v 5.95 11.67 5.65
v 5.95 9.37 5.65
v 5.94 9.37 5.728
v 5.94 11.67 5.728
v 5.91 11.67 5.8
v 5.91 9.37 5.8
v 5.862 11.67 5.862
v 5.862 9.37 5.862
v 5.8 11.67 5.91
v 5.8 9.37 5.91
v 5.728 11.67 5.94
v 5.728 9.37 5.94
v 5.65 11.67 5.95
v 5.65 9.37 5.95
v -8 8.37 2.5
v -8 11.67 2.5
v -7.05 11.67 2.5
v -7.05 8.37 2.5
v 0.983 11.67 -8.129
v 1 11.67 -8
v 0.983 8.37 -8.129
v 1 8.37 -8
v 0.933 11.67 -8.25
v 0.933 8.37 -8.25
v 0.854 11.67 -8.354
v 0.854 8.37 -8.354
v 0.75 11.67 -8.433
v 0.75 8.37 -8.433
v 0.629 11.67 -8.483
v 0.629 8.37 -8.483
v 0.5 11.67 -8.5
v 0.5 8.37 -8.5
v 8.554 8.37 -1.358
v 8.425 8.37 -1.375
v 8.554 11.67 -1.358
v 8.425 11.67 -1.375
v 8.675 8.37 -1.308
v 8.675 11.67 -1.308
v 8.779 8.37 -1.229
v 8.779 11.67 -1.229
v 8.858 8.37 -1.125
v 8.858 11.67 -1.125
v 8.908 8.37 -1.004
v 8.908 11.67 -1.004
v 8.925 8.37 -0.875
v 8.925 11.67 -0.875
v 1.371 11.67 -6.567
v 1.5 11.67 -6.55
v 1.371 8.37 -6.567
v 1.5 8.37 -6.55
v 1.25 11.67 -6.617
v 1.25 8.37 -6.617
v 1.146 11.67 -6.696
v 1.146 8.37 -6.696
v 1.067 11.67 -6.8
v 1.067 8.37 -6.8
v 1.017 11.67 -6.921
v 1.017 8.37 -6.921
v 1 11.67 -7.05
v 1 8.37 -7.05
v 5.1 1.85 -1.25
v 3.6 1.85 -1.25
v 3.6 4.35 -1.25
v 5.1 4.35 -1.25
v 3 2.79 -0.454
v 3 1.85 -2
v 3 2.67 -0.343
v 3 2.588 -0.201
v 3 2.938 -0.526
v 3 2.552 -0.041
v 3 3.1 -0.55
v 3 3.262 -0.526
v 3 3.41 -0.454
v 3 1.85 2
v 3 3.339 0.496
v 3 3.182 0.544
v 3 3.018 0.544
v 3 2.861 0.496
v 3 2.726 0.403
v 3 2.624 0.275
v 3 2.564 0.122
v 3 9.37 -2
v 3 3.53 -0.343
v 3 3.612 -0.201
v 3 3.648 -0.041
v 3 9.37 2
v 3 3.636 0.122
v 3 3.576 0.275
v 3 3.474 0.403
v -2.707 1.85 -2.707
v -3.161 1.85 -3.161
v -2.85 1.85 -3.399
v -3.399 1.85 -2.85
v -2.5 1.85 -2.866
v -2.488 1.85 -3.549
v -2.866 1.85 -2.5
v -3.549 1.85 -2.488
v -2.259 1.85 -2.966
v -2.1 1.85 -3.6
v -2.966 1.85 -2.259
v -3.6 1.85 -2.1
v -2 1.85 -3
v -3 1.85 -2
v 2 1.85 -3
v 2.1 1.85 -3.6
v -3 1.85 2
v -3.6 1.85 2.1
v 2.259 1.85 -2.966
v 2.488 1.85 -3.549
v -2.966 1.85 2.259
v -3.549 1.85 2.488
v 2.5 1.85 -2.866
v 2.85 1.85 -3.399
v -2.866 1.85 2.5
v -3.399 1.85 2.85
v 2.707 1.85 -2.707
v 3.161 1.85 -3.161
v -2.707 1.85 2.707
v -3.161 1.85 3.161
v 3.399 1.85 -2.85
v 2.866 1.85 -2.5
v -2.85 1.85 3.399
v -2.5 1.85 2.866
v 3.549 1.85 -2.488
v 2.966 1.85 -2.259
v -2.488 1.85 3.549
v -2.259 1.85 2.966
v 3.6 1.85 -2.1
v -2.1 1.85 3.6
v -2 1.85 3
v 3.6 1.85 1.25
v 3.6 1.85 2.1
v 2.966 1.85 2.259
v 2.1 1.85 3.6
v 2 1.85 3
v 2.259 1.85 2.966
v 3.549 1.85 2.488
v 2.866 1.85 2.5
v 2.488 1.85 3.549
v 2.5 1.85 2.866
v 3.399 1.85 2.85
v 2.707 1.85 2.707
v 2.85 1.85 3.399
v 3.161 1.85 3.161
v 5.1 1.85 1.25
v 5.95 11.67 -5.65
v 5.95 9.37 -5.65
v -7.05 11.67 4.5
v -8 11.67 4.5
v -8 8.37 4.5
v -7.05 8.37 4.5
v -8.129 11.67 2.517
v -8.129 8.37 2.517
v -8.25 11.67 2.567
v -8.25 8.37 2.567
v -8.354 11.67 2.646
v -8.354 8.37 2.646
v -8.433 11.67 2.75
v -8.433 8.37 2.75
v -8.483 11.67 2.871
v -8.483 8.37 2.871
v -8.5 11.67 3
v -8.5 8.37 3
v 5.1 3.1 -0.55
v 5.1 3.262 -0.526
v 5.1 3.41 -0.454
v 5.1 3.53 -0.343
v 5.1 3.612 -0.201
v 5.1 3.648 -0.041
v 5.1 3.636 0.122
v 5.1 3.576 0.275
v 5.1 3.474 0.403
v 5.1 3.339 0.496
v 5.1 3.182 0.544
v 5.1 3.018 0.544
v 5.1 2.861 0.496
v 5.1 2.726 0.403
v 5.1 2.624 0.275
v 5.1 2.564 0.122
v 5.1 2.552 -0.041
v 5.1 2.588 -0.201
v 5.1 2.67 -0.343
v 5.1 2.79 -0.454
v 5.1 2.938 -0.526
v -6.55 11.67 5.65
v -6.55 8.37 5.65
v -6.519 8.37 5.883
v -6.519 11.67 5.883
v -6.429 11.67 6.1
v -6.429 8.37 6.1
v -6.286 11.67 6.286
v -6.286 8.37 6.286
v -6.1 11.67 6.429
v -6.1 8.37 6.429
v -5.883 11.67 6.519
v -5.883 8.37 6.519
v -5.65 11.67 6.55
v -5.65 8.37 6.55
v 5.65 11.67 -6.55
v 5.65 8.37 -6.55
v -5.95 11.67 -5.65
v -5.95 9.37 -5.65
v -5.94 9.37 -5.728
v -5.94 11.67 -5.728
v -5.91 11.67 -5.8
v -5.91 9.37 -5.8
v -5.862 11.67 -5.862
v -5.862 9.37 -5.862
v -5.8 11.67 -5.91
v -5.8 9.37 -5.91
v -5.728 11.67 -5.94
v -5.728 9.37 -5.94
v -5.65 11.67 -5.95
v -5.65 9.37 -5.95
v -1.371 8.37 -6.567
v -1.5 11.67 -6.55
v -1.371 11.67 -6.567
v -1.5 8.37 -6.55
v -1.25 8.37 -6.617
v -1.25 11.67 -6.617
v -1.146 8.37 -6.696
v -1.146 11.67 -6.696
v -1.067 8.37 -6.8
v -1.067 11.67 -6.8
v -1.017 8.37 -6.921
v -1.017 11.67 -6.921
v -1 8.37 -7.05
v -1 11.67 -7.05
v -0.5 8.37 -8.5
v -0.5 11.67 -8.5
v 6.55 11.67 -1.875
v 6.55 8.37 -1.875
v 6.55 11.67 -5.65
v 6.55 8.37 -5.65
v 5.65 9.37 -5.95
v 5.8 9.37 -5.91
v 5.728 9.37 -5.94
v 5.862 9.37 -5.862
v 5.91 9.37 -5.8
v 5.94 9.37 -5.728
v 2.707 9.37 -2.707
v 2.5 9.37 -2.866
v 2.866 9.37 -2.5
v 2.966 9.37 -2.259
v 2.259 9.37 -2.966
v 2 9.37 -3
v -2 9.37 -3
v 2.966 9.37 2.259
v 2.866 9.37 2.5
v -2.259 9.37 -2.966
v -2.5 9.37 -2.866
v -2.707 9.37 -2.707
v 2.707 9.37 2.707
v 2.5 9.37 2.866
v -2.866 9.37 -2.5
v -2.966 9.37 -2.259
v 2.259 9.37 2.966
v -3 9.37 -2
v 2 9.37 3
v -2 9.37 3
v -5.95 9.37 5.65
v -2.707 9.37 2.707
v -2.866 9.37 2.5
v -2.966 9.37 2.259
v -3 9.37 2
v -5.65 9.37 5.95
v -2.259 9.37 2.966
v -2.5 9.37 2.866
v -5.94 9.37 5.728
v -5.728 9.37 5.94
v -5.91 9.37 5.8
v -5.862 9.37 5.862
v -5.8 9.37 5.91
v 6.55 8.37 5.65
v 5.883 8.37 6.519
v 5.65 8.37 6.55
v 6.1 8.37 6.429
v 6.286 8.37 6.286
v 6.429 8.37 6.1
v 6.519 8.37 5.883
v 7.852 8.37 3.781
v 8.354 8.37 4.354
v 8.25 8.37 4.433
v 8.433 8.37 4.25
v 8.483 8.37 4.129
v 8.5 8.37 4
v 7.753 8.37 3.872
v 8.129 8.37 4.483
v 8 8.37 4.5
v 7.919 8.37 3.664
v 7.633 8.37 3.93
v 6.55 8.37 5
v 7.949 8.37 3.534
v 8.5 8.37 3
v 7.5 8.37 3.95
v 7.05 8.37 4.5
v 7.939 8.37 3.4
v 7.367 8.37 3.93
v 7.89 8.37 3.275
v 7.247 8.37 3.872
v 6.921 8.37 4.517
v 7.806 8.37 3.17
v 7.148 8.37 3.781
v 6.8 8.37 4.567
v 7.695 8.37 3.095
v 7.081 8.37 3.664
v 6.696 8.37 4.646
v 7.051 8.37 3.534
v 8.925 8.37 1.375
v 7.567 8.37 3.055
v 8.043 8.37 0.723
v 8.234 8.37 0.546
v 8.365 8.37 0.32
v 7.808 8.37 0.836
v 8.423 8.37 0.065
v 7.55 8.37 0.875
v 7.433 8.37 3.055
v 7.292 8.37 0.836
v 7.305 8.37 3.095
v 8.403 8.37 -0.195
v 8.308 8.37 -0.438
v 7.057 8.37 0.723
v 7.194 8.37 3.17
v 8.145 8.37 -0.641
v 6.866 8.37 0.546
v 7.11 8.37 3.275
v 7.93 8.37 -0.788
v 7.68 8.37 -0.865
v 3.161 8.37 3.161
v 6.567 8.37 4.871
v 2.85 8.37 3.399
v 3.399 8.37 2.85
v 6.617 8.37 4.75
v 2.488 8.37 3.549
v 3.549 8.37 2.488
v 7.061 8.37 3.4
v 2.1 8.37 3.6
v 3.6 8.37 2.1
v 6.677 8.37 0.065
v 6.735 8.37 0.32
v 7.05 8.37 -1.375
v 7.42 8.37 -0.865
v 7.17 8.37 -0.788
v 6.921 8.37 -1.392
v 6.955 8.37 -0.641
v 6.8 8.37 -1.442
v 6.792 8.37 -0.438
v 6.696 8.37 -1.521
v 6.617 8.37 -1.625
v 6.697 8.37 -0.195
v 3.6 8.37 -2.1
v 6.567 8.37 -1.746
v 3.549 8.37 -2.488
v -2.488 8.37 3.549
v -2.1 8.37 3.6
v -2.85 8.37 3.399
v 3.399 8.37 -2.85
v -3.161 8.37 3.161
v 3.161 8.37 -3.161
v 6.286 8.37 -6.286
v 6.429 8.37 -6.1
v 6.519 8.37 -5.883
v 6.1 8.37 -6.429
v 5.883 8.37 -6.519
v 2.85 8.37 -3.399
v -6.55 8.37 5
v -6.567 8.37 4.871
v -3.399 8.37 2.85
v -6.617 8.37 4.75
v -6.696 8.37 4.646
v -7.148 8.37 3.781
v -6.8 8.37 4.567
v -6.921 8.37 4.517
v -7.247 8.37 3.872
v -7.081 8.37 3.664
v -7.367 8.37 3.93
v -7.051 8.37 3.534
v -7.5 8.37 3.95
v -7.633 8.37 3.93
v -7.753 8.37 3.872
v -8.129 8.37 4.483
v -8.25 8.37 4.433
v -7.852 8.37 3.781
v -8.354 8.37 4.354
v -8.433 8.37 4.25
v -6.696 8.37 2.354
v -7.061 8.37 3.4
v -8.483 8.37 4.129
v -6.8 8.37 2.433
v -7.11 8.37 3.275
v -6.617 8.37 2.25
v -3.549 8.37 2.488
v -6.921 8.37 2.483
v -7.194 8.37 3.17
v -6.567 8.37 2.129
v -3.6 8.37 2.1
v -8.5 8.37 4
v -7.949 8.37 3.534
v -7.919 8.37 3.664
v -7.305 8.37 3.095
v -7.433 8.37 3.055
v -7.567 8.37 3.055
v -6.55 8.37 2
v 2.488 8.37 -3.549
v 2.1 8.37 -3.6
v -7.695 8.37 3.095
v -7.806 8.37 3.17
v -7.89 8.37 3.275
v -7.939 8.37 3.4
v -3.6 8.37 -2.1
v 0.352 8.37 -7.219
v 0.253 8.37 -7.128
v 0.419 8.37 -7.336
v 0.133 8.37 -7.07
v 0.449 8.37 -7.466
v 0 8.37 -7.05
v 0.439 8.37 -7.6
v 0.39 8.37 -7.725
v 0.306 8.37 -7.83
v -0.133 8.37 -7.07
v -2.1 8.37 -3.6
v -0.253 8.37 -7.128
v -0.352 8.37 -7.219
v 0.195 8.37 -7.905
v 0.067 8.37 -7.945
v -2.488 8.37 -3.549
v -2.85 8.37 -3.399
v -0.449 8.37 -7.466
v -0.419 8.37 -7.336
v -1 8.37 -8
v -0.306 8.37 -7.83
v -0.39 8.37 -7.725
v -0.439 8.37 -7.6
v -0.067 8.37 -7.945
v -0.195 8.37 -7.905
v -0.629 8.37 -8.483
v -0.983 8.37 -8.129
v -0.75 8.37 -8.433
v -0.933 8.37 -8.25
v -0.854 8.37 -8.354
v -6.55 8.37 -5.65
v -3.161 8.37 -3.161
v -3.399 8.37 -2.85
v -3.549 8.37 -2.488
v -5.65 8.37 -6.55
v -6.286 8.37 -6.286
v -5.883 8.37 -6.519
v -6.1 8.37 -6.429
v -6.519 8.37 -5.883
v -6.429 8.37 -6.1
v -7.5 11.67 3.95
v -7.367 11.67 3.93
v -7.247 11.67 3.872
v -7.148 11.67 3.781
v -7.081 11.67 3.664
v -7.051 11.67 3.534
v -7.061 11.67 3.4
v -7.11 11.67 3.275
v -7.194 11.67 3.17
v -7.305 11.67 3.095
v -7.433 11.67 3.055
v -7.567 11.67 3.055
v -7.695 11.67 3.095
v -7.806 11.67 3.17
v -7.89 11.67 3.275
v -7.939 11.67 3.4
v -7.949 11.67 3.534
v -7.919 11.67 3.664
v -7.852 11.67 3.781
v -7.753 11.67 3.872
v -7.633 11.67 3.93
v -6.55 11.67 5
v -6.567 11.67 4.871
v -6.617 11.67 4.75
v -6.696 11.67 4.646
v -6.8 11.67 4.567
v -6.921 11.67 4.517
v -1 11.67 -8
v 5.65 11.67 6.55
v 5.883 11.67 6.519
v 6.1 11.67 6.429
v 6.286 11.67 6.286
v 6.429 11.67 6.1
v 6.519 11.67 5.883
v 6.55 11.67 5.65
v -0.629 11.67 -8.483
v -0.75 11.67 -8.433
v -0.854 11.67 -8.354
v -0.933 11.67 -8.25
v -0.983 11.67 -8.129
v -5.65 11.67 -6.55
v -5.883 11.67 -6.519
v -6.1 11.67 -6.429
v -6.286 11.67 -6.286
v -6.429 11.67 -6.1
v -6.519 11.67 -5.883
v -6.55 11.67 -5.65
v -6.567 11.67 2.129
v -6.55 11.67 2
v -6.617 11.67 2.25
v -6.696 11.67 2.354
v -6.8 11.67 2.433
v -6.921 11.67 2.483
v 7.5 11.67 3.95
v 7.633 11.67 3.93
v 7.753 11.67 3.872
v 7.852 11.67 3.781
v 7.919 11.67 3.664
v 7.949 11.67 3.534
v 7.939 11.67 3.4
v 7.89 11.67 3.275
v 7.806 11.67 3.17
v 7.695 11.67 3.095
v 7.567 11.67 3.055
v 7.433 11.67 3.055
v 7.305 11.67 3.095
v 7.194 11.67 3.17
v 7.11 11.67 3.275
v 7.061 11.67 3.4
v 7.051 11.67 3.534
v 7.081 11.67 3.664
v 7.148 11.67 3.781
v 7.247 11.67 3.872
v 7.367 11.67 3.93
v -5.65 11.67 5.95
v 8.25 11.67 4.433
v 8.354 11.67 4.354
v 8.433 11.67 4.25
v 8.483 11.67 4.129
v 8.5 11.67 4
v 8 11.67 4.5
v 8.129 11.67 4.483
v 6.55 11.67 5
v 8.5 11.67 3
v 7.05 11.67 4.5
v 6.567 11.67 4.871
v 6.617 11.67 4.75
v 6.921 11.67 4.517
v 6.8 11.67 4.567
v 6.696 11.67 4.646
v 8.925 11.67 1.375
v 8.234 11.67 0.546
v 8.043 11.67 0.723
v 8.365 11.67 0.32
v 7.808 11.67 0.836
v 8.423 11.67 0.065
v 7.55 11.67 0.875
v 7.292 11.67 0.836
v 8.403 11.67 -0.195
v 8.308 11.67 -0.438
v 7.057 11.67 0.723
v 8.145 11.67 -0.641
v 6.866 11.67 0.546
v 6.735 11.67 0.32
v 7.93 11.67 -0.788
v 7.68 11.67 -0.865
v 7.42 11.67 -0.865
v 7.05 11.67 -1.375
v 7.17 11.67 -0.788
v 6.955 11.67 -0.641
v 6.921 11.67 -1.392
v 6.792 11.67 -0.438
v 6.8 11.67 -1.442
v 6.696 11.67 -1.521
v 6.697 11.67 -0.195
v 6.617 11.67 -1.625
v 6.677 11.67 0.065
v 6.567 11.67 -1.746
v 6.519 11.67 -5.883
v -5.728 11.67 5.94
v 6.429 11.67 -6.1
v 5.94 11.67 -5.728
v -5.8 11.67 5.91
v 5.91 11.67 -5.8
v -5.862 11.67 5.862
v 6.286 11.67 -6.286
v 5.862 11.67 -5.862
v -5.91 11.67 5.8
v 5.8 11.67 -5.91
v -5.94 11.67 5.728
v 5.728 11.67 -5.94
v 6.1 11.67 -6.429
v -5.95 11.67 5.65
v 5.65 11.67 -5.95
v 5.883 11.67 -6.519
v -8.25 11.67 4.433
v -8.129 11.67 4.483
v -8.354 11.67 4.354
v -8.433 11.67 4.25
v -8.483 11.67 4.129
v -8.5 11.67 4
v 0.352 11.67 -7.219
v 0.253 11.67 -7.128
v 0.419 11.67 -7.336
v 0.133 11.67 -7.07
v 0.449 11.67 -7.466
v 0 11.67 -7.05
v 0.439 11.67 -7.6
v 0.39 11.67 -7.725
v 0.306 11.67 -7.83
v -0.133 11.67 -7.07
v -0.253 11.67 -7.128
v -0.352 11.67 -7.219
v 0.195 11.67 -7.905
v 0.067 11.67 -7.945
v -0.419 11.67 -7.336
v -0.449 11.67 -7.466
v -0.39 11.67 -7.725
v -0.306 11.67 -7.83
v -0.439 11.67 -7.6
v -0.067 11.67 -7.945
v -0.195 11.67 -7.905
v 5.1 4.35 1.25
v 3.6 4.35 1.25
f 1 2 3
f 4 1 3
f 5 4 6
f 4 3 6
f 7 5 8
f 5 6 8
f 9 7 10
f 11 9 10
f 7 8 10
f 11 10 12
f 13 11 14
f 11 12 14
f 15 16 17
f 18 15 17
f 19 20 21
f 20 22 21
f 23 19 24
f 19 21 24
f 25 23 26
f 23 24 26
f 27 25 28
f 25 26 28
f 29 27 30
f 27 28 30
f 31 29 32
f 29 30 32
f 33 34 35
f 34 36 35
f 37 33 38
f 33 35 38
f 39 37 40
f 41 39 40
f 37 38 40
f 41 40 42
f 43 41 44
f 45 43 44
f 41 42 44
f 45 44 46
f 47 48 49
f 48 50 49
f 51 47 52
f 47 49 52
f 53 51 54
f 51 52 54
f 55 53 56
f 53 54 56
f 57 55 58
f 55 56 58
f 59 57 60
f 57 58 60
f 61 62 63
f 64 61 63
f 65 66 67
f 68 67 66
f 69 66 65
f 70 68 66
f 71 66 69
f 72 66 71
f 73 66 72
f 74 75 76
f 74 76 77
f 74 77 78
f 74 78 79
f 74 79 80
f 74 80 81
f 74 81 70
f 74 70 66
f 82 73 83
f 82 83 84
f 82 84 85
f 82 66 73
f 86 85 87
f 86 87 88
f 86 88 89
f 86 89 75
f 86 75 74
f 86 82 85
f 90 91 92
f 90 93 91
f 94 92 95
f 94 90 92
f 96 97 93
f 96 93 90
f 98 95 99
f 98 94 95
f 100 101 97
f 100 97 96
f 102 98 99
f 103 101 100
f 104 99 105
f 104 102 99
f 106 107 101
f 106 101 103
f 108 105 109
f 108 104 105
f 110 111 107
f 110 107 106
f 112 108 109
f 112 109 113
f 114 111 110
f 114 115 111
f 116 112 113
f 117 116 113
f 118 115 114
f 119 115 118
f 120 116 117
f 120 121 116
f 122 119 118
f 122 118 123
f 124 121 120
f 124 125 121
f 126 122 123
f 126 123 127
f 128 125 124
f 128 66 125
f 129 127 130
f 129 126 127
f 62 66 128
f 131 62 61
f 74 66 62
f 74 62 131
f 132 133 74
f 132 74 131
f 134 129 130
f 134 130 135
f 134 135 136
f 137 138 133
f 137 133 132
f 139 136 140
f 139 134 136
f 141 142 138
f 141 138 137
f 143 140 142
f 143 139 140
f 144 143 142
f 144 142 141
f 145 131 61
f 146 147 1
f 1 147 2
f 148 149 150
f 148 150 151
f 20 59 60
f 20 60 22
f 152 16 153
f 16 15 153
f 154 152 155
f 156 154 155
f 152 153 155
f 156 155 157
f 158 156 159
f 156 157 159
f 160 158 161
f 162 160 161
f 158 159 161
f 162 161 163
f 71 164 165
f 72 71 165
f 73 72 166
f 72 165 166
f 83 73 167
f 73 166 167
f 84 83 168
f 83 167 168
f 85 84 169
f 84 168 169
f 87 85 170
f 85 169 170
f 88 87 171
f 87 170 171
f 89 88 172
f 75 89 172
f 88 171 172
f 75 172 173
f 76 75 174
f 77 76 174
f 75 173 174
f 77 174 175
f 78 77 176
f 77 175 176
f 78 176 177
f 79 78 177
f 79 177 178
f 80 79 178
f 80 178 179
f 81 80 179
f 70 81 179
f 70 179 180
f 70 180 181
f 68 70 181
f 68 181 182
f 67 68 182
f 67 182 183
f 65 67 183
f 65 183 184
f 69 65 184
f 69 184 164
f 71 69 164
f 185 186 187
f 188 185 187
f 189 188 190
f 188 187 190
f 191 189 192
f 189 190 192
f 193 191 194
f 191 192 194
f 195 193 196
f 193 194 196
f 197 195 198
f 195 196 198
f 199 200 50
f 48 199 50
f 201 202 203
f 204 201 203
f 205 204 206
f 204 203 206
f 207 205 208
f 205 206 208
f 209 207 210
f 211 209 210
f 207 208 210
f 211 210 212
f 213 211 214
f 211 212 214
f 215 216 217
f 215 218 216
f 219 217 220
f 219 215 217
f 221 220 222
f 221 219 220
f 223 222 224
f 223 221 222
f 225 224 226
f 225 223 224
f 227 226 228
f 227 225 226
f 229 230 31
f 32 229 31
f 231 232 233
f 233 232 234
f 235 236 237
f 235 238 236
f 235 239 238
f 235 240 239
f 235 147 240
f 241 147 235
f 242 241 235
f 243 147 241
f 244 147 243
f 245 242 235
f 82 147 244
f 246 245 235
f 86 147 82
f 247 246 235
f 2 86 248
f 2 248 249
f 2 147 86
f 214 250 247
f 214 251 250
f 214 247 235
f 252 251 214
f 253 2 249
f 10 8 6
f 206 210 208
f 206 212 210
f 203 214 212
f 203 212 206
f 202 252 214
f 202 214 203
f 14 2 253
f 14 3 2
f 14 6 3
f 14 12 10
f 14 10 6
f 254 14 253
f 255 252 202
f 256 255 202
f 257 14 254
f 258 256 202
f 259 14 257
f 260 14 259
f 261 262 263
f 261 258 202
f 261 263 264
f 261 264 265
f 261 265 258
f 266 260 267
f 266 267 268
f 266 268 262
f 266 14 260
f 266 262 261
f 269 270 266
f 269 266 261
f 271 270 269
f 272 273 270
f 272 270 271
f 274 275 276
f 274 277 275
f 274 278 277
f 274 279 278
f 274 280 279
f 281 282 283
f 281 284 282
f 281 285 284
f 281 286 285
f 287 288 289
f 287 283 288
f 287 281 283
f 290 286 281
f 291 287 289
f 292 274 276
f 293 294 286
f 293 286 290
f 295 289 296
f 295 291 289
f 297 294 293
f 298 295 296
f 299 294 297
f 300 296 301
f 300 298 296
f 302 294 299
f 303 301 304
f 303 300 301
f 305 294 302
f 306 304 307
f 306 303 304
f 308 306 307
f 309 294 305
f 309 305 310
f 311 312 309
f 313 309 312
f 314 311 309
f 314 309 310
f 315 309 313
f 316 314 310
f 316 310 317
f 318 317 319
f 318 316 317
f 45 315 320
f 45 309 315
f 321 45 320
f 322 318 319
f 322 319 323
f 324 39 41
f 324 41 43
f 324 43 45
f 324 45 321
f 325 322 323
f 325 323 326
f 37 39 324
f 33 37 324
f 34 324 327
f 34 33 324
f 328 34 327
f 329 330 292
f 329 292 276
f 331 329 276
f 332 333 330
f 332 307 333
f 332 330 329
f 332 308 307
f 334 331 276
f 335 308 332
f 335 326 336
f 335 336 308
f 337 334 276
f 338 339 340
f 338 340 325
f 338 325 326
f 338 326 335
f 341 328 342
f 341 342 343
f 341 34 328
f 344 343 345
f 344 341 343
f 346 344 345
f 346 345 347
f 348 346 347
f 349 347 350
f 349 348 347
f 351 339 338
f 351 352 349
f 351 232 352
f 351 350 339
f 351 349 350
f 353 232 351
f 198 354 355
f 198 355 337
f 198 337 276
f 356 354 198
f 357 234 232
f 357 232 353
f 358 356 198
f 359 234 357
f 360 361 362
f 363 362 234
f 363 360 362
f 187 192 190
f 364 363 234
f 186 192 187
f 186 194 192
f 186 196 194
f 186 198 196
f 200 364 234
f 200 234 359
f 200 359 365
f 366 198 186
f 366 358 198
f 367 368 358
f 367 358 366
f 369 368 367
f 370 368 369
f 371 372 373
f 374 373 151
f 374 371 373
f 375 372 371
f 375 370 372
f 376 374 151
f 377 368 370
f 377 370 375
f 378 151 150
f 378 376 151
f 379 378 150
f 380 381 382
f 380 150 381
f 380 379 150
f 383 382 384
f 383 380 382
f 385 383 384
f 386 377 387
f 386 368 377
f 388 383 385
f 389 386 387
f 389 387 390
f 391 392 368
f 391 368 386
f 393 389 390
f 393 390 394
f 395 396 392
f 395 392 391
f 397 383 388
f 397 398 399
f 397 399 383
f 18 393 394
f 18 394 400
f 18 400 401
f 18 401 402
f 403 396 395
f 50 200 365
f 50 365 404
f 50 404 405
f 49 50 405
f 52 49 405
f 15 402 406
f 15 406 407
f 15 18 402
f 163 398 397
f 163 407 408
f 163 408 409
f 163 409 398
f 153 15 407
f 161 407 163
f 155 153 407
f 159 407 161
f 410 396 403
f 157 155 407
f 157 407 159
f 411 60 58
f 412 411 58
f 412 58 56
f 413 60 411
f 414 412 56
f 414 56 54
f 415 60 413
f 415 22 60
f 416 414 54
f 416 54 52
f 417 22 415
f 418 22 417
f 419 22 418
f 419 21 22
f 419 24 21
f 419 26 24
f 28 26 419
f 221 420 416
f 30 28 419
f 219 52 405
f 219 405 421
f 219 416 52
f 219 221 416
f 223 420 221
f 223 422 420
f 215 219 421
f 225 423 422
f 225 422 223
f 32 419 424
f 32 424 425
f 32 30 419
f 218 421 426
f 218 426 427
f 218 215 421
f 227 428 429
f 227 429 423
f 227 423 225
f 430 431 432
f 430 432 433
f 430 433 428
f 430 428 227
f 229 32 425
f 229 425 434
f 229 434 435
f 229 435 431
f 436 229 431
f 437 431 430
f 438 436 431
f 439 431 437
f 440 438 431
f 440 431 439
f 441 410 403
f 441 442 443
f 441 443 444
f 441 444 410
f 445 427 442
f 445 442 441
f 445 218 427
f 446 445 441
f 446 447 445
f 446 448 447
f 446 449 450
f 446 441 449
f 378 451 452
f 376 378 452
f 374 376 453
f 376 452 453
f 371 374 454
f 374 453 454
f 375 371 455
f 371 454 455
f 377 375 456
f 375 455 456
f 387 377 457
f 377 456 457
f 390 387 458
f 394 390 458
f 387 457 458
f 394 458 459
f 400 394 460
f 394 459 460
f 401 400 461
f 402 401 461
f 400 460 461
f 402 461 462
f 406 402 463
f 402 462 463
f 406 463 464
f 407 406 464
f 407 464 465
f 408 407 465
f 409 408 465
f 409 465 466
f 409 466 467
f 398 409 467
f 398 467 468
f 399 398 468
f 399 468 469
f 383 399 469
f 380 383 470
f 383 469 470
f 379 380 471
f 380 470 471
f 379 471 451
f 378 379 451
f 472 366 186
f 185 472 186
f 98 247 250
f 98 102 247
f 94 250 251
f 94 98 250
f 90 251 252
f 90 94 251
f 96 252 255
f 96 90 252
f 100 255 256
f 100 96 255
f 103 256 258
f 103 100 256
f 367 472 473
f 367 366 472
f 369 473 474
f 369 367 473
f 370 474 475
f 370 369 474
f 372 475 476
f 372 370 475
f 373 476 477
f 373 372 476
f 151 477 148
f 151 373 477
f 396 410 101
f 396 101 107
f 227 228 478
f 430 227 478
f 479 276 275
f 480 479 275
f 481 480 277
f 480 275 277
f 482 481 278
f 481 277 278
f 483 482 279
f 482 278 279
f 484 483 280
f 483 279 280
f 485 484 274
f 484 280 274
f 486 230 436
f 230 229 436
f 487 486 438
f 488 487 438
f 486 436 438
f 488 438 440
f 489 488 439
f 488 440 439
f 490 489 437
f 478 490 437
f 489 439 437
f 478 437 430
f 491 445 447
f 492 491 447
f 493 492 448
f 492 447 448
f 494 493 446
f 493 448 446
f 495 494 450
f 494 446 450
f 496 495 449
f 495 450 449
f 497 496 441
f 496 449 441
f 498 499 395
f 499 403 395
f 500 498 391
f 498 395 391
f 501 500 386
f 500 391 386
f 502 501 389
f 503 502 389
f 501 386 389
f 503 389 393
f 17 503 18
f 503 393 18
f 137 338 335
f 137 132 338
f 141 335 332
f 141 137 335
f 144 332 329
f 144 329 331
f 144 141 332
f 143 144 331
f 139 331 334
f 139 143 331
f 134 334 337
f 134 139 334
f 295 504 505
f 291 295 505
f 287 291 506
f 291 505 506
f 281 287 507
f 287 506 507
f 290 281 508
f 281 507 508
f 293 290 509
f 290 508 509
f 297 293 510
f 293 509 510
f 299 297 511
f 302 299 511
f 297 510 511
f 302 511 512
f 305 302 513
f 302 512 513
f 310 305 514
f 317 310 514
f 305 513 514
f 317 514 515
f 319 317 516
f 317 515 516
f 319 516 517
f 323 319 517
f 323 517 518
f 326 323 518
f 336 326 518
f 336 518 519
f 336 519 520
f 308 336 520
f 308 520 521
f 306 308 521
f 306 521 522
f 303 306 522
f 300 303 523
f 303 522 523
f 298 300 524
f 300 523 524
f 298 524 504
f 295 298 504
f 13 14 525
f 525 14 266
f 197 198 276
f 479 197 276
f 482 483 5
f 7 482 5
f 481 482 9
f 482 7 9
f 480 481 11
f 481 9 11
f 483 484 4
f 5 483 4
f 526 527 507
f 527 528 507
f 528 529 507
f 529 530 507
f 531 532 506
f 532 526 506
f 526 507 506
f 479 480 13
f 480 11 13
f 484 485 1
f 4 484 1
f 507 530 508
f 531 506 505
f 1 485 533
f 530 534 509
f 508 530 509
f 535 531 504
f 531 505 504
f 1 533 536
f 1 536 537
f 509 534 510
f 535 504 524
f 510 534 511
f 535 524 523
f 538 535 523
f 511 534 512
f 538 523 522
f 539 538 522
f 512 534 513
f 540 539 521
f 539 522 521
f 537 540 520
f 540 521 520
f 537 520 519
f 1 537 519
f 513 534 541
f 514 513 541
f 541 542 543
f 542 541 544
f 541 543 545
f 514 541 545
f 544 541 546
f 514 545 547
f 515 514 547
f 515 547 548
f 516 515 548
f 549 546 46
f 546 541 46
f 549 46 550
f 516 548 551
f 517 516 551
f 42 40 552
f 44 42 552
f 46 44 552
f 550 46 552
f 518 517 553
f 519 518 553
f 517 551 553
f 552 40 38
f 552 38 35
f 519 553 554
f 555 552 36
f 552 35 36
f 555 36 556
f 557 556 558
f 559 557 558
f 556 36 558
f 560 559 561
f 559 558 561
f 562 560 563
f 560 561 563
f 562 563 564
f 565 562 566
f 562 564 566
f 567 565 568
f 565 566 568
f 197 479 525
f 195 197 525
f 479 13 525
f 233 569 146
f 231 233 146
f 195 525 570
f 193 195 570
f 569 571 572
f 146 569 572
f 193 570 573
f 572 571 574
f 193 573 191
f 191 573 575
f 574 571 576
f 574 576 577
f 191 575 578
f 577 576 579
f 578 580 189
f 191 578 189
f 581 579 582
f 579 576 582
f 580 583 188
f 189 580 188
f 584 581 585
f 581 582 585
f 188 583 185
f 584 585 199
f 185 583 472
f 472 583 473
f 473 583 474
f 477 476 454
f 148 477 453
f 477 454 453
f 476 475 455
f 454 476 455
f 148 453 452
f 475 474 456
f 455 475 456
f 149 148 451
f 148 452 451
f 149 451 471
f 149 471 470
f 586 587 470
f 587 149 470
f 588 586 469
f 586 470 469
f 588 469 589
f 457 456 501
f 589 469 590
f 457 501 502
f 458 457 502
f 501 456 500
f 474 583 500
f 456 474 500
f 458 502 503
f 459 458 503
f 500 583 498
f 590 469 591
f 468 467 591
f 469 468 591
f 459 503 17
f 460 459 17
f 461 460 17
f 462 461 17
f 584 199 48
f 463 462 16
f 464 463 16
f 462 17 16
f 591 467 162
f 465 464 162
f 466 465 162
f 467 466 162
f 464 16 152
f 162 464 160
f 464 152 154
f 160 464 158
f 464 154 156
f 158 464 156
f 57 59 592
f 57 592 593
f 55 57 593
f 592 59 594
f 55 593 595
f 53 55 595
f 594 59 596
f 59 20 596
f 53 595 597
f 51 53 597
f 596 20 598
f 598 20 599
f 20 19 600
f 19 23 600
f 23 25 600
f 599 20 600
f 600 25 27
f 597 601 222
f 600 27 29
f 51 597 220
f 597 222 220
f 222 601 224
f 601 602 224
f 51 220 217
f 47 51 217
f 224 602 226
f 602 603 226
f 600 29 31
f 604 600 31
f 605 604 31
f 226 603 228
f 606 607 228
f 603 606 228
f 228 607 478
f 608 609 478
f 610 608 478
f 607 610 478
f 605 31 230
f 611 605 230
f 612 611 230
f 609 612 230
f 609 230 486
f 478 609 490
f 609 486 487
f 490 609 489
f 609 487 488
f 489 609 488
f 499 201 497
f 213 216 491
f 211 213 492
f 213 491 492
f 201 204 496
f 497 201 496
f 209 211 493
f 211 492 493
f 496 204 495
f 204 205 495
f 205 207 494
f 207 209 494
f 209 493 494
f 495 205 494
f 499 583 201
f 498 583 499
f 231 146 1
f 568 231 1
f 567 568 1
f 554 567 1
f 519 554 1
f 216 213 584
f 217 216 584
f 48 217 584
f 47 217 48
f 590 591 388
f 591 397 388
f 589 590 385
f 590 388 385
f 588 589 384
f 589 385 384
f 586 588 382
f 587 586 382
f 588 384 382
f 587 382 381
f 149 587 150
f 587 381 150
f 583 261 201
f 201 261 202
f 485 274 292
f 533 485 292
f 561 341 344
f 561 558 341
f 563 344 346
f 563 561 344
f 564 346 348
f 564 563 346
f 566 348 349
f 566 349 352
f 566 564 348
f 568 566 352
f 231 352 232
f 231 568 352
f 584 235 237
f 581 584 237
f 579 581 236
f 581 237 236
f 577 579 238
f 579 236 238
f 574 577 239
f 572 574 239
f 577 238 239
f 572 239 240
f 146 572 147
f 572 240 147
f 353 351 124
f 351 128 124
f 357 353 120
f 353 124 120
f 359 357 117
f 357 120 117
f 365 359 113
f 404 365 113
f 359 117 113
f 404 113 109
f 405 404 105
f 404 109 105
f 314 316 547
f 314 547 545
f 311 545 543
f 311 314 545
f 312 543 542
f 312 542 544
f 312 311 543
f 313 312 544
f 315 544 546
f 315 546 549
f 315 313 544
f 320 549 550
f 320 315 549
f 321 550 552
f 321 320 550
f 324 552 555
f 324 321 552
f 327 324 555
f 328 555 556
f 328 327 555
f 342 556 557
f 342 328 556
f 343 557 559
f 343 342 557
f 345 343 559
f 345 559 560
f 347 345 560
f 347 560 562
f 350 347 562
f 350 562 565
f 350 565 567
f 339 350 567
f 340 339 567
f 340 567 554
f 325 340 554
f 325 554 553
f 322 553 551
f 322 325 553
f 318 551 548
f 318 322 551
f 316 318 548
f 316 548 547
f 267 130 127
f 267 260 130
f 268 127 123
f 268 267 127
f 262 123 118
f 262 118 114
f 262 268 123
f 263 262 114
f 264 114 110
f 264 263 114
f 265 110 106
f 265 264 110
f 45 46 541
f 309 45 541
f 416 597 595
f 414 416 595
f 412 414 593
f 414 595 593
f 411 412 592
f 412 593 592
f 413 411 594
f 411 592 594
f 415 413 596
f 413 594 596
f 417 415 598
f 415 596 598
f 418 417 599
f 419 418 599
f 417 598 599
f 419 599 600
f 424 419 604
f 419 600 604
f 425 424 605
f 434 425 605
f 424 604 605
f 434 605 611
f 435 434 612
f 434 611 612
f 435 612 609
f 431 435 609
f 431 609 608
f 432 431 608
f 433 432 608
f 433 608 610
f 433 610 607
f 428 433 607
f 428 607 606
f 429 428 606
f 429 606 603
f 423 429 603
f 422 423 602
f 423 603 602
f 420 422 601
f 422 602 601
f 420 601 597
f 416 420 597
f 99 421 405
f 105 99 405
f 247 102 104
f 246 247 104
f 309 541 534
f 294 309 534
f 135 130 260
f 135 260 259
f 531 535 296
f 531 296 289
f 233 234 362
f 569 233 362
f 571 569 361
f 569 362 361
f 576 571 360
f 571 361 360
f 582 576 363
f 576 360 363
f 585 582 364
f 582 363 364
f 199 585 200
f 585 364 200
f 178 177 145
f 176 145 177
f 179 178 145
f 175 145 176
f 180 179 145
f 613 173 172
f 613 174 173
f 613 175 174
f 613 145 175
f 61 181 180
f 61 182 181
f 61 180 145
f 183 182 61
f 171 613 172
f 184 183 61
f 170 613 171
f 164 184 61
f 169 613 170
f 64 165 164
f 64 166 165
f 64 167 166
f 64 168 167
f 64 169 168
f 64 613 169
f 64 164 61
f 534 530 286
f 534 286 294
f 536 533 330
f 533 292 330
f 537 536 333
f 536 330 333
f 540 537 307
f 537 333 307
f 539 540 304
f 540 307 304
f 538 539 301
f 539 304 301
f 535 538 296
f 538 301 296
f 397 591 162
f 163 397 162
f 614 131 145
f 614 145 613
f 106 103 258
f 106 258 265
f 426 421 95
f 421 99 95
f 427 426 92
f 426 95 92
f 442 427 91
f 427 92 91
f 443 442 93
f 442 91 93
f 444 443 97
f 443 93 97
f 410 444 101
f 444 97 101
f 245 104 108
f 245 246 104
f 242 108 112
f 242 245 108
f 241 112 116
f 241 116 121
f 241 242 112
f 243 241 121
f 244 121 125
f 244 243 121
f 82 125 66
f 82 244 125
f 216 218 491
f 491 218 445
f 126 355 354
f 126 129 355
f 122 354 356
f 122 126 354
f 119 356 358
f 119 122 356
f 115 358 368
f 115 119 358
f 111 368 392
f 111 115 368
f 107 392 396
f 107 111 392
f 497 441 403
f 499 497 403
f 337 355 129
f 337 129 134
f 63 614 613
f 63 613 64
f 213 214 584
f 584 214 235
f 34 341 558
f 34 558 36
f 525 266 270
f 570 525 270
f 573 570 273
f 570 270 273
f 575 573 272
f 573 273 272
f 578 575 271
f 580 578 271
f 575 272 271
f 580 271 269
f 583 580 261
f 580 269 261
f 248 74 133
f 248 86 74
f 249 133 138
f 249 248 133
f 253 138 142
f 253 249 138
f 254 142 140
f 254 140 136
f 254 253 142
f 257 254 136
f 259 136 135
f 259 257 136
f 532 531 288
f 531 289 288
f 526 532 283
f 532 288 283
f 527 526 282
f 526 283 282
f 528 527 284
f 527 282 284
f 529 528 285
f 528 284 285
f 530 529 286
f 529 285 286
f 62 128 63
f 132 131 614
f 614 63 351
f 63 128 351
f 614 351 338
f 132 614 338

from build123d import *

# Parameters (mm, degrees)
BOSS_EXTRUDE1_DEPTH       = 2.3
BOSS_EXTRUDE2_START       = 1
BOSS_EXTRUDE2_DEPTH       = 1
SKETCH19_W                = 2
SKETCH19_H                = 1.95
SKETCH19_R                = 0.45
SKETCH19_W_2              = 1.95
SKETCH19_H_2              = 2
CMOS_MOUNTING_HOLES_DEPTH = 3.3
FILLET1_R                 = 0.5
SKETCH21_W                = 7.2
SKETCH21_H                = 7.2
SKETCH21_W_2              = 6
SKETCH21_H_2              = 6
COLUMN_DEPTH              = 6.52
SKETCH22_W                = 6
SKETCH22_H                = 6
COLUMN_EXTRUDED_CUT_DEPTH = 14.675174588
COLUMN_OUTSIDE_FILLET_R   = 1.5
COLUMN_INSIDE_FILLET_R    = 1
SKETCH25_W                = 2.5
SKETCH25_H                = 2.5
SET_SCREW_EXTRUSION_DEPTH = 1.5
SET_SCREW_HOLE_REACH      = 21.834
SKETCH26_R                = 0.55
LARGE_START               = -3.3
SKETCH29_R                = 0.875
LARGE_WIRE_HOLE_DEPTH     = 3.3
FILLET3_R                 = 0.5


with BuildPart() as part:
    # Sketch4 → Boss-Extrude1 (new body)
    with BuildSketch(Plane(origin=(0, 9.37, 0), x_dir=(1, 0, 0), z_dir=(0, 1, 0))):
        with BuildLine():
            Line((-6.55, 5.65), (-6.55, -5.65))
            ThreePointArc((-6.55, -5.65), (-6.286396103, -6.286396103), (-5.65, -6.55))
            Line((-5.65, -6.55), (5.65, -6.55))
            ThreePointArc((5.65, -6.55), (6.286396103, -6.286396103), (6.55, -5.65))
            Line((6.55, -5.65), (6.55, 5.65))
            ThreePointArc((6.55, 5.65), (6.286396103, 6.286396103), (5.65, 6.55))
            Line((5.65, 6.55), (-5.65, 6.55))
            ThreePointArc((-5.65, 6.55), (-6.286396103, 6.286396103), (-6.55, 5.65))
        make_face()
        with BuildLine():
            Line((-5.65, 5.95), (5.65, 5.95))
            ThreePointArc((5.65, 5.95), (5.862132034, 5.862132034), (5.95, 5.65))
            Line((5.95, 5.65), (5.95, -5.65))
            ThreePointArc((5.95, -5.65), (5.862132034, -5.862132034), (5.65, -5.95))
            Line((5.65, -5.95), (-5.65, -5.95))
            ThreePointArc((-5.65, -5.95), (-5.862132034, -5.862132034), (-5.95, -5.65))
            Line((-5.95, -5.65), (-5.95, 5.65))
            ThreePointArc((-5.95, 5.65), (-5.862132034, 5.862132034), (-5.65, 5.95))
        make_face(mode=Mode.SUBTRACT)
    extrude(amount=BOSS_EXTRUDE1_DEPTH)

    # Sketch20 → Boss-Extrude2 (add)
    with BuildSketch(Plane.XZ.offset(-9.37).offset(BOSS_EXTRUDE2_START)):
        with BuildLine():
            Line((5.65, -6.55), (-5.65, -6.55))
            ThreePointArc((-5.65, -6.55), (-6.286396103, -6.286396103), (-6.55, -5.65))
            Line((-6.55, -5.65), (-6.55, 5.65))
            ThreePointArc((-6.55, 5.65), (-6.286396103, 6.286396103), (-5.65, 6.55))
            Line((-5.65, 6.55), (5.65, 6.55))
            ThreePointArc((5.65, 6.55), (6.286396103, 6.286396103), (6.55, 5.65))
            Line((6.55, 5.65), (6.55, -5.65))
            ThreePointArc((6.55, -5.65), (6.286396103, -6.286396103), (5.65, -6.55))
        make_face()
    extrude(amount=-BOSS_EXTRUDE2_DEPTH)

    # Sketch19 → CMOS Mounting Holes (add)
    # profile 1 of 3: a face of its own
    with BuildSketch(Plane(origin=(0, 11.67, 0), x_dir=(1, 0, 0), z_dir=(0, 1, 0))):
        with Locations((0, 7.525)):
            Rectangle(SKETCH19_W, SKETCH19_H)
        with Locations(Location((0, 7.5, 0), (0, 0, 270))):
            Circle(SKETCH19_R, mode=Mode.SUBTRACT)
    # profile 2 of 3: a face of its own
    with BuildSketch(Plane(origin=(0, 11.67, 0), x_dir=(1, 0, 0), z_dir=(0, 1, 0))):
        with Locations((-7.525, -3.5)):
            Rectangle(SKETCH19_W_2, SKETCH19_H_2)
        with Locations(Location((-7.5, -3.5, 0), (0, 0, 270))):
            Circle(SKETCH19_R, mode=Mode.SUBTRACT)
    # profile 3 of 3: a face of its own
    with BuildSketch(Plane(origin=(0, 11.67, 0), x_dir=(1, 0, 0), z_dir=(0, 1, 0))):
        with Locations((7.525, -3.5)):
            Rectangle(SKETCH19_W_2, SKETCH19_H_2)
        with Locations(Location((7.5, -3.5, 0), (0, 0, 270))):
            Circle(SKETCH19_R, mode=Mode.SUBTRACT)
    extrude(amount=-CMOS_MOUNTING_HOLES_DEPTH)

    # Fillet1
    fillet1_edges = [part.edges().sort_by_distance(p)[0] for p in [
        (1, 10.02, -6.55),
        (-1, 10.02, -6.55),
        (-1, 10.02, -8.5),
        (1, 10.02, -8.5),
        (-6.55, 10.02, 2.5),
        (-6.55, 10.02, 4.5),
        (-8.5, 10.02, 4.5),
        (-8.5, 10.02, 2.5),
        (6.55, 10.02, 4.5),
        (6.55, 10.02, 2.5),
        (8.5, 10.02, 2.5),
        (8.5, 10.02, 4.5),
    ]]
    fillet(fillet1_edges, radius=FILLET1_R)

    # Sketch21 → Column (add)
    with BuildSketch(Plane.XZ.offset(-8.37)):
        Rectangle(SKETCH21_W, SKETCH21_H)
        Rectangle(SKETCH21_W_2, SKETCH21_H_2, mode=Mode.SUBTRACT)
    extrude(amount=COLUMN_DEPTH)

    # Sketch22 → Column Extruded Cut (cut, through all)
    with BuildSketch(Plane.XZ.offset(-8.37)):
        Rectangle(SKETCH22_W, SKETCH22_H)
    extrude(amount=-COLUMN_EXTRUDED_CUT_DEPTH, mode=Mode.SUBTRACT)

    # Column Outside Fillet
    column_outside_fillet_edges = [part.edges().sort_by_distance(p)[0] for p in [
        (-3.6, 5.11, 3.6),
        (-3.6, 5.11, -3.6),
        (3.6, 5.11, -3.6),
        (3.6, 5.11, 3.6),
    ]]
    fillet(column_outside_fillet_edges, radius=COLUMN_OUTSIDE_FILLET_R)

    # Column Inside Fillet
    column_inside_fillet_edges = [part.edges().sort_by_distance(p)[0] for p in [
        (-3, 5.61, -3),
        (3, 5.61, -3),
        (3, 5.61, 3),
        (-3, 5.61, 3),
    ]]
    fillet(column_inside_fillet_edges, radius=COLUMN_INSIDE_FILLET_R)

    # Sketch25 → Set Screw Extrusion (add)
    with BuildSketch(Plane(origin=(3.6, 0, 0), x_dir=(0, 0, -1), z_dir=(1, 0, 0))):
        with Locations((0, 3.1)):
            Rectangle(SKETCH25_W, SKETCH25_H)
    extrude(amount=SET_SCREW_EXTRUSION_DEPTH)

    # Sketch26 → Set Screw Hole (cut, up to next)
    with BuildSketch(Plane(origin=(5.1, 0, 0), x_dir=(0, 0, -1), z_dir=(1, 0, 0)), mode=Mode.PRIVATE) as set_screw_hole_sk1:
        with Locations((0, 3.1)):
            Circle(SKETCH26_R)
    set_screw_hole_tool1 = extrude(set_screw_hole_sk1.sketch, amount=-SET_SCREW_HOLE_REACH, mode=Mode.PRIVATE) & part.part
    add(set_screw_hole_tool1.solids().sort_by_distance((5.1, 3.1, 0))[0], mode=Mode.SUBTRACT)

    # Sketch29 → Large Wire Hole (add)
    with BuildSketch(Plane(origin=(0, 11.67, 0), x_dir=(1, 0, 0), z_dir=(0, 1, 0)).offset(LARGE_START)):
        with BuildLine():
            Line((6.55, -2), (6.55, 1.375))
            Line((6.55, 1.375), (8.925, 1.375))
            Line((8.925, 1.375), (8.925, -1.375))
            Line((8.925, -1.375), (8.5, -3))
            ThreePointArc((8.5, -3), (8.353553391, -2.646446609), (8, -2.5))
            Line((8, -2.5), (7.05, -2.5))
            ThreePointArc((7.05, -2.5), (6.696446609, -2.353553391), (6.55, -2))
        make_face()
        with Locations(Location((7.55, 0, 0), (0, 0, 270))):
            Circle(SKETCH29_R, mode=Mode.SUBTRACT)
    extrude(amount=LARGE_WIRE_HOLE_DEPTH)

    # Fillet3
    fillet3_edges = [part.edges().sort_by_distance(p)[0] for p in [
        (6.55, 10.02, -1.375),
        (8.925, 10.02, -1.375),
    ]]
    fillet(fillet3_edges, radius=FILLET3_R)


solid = part.part
